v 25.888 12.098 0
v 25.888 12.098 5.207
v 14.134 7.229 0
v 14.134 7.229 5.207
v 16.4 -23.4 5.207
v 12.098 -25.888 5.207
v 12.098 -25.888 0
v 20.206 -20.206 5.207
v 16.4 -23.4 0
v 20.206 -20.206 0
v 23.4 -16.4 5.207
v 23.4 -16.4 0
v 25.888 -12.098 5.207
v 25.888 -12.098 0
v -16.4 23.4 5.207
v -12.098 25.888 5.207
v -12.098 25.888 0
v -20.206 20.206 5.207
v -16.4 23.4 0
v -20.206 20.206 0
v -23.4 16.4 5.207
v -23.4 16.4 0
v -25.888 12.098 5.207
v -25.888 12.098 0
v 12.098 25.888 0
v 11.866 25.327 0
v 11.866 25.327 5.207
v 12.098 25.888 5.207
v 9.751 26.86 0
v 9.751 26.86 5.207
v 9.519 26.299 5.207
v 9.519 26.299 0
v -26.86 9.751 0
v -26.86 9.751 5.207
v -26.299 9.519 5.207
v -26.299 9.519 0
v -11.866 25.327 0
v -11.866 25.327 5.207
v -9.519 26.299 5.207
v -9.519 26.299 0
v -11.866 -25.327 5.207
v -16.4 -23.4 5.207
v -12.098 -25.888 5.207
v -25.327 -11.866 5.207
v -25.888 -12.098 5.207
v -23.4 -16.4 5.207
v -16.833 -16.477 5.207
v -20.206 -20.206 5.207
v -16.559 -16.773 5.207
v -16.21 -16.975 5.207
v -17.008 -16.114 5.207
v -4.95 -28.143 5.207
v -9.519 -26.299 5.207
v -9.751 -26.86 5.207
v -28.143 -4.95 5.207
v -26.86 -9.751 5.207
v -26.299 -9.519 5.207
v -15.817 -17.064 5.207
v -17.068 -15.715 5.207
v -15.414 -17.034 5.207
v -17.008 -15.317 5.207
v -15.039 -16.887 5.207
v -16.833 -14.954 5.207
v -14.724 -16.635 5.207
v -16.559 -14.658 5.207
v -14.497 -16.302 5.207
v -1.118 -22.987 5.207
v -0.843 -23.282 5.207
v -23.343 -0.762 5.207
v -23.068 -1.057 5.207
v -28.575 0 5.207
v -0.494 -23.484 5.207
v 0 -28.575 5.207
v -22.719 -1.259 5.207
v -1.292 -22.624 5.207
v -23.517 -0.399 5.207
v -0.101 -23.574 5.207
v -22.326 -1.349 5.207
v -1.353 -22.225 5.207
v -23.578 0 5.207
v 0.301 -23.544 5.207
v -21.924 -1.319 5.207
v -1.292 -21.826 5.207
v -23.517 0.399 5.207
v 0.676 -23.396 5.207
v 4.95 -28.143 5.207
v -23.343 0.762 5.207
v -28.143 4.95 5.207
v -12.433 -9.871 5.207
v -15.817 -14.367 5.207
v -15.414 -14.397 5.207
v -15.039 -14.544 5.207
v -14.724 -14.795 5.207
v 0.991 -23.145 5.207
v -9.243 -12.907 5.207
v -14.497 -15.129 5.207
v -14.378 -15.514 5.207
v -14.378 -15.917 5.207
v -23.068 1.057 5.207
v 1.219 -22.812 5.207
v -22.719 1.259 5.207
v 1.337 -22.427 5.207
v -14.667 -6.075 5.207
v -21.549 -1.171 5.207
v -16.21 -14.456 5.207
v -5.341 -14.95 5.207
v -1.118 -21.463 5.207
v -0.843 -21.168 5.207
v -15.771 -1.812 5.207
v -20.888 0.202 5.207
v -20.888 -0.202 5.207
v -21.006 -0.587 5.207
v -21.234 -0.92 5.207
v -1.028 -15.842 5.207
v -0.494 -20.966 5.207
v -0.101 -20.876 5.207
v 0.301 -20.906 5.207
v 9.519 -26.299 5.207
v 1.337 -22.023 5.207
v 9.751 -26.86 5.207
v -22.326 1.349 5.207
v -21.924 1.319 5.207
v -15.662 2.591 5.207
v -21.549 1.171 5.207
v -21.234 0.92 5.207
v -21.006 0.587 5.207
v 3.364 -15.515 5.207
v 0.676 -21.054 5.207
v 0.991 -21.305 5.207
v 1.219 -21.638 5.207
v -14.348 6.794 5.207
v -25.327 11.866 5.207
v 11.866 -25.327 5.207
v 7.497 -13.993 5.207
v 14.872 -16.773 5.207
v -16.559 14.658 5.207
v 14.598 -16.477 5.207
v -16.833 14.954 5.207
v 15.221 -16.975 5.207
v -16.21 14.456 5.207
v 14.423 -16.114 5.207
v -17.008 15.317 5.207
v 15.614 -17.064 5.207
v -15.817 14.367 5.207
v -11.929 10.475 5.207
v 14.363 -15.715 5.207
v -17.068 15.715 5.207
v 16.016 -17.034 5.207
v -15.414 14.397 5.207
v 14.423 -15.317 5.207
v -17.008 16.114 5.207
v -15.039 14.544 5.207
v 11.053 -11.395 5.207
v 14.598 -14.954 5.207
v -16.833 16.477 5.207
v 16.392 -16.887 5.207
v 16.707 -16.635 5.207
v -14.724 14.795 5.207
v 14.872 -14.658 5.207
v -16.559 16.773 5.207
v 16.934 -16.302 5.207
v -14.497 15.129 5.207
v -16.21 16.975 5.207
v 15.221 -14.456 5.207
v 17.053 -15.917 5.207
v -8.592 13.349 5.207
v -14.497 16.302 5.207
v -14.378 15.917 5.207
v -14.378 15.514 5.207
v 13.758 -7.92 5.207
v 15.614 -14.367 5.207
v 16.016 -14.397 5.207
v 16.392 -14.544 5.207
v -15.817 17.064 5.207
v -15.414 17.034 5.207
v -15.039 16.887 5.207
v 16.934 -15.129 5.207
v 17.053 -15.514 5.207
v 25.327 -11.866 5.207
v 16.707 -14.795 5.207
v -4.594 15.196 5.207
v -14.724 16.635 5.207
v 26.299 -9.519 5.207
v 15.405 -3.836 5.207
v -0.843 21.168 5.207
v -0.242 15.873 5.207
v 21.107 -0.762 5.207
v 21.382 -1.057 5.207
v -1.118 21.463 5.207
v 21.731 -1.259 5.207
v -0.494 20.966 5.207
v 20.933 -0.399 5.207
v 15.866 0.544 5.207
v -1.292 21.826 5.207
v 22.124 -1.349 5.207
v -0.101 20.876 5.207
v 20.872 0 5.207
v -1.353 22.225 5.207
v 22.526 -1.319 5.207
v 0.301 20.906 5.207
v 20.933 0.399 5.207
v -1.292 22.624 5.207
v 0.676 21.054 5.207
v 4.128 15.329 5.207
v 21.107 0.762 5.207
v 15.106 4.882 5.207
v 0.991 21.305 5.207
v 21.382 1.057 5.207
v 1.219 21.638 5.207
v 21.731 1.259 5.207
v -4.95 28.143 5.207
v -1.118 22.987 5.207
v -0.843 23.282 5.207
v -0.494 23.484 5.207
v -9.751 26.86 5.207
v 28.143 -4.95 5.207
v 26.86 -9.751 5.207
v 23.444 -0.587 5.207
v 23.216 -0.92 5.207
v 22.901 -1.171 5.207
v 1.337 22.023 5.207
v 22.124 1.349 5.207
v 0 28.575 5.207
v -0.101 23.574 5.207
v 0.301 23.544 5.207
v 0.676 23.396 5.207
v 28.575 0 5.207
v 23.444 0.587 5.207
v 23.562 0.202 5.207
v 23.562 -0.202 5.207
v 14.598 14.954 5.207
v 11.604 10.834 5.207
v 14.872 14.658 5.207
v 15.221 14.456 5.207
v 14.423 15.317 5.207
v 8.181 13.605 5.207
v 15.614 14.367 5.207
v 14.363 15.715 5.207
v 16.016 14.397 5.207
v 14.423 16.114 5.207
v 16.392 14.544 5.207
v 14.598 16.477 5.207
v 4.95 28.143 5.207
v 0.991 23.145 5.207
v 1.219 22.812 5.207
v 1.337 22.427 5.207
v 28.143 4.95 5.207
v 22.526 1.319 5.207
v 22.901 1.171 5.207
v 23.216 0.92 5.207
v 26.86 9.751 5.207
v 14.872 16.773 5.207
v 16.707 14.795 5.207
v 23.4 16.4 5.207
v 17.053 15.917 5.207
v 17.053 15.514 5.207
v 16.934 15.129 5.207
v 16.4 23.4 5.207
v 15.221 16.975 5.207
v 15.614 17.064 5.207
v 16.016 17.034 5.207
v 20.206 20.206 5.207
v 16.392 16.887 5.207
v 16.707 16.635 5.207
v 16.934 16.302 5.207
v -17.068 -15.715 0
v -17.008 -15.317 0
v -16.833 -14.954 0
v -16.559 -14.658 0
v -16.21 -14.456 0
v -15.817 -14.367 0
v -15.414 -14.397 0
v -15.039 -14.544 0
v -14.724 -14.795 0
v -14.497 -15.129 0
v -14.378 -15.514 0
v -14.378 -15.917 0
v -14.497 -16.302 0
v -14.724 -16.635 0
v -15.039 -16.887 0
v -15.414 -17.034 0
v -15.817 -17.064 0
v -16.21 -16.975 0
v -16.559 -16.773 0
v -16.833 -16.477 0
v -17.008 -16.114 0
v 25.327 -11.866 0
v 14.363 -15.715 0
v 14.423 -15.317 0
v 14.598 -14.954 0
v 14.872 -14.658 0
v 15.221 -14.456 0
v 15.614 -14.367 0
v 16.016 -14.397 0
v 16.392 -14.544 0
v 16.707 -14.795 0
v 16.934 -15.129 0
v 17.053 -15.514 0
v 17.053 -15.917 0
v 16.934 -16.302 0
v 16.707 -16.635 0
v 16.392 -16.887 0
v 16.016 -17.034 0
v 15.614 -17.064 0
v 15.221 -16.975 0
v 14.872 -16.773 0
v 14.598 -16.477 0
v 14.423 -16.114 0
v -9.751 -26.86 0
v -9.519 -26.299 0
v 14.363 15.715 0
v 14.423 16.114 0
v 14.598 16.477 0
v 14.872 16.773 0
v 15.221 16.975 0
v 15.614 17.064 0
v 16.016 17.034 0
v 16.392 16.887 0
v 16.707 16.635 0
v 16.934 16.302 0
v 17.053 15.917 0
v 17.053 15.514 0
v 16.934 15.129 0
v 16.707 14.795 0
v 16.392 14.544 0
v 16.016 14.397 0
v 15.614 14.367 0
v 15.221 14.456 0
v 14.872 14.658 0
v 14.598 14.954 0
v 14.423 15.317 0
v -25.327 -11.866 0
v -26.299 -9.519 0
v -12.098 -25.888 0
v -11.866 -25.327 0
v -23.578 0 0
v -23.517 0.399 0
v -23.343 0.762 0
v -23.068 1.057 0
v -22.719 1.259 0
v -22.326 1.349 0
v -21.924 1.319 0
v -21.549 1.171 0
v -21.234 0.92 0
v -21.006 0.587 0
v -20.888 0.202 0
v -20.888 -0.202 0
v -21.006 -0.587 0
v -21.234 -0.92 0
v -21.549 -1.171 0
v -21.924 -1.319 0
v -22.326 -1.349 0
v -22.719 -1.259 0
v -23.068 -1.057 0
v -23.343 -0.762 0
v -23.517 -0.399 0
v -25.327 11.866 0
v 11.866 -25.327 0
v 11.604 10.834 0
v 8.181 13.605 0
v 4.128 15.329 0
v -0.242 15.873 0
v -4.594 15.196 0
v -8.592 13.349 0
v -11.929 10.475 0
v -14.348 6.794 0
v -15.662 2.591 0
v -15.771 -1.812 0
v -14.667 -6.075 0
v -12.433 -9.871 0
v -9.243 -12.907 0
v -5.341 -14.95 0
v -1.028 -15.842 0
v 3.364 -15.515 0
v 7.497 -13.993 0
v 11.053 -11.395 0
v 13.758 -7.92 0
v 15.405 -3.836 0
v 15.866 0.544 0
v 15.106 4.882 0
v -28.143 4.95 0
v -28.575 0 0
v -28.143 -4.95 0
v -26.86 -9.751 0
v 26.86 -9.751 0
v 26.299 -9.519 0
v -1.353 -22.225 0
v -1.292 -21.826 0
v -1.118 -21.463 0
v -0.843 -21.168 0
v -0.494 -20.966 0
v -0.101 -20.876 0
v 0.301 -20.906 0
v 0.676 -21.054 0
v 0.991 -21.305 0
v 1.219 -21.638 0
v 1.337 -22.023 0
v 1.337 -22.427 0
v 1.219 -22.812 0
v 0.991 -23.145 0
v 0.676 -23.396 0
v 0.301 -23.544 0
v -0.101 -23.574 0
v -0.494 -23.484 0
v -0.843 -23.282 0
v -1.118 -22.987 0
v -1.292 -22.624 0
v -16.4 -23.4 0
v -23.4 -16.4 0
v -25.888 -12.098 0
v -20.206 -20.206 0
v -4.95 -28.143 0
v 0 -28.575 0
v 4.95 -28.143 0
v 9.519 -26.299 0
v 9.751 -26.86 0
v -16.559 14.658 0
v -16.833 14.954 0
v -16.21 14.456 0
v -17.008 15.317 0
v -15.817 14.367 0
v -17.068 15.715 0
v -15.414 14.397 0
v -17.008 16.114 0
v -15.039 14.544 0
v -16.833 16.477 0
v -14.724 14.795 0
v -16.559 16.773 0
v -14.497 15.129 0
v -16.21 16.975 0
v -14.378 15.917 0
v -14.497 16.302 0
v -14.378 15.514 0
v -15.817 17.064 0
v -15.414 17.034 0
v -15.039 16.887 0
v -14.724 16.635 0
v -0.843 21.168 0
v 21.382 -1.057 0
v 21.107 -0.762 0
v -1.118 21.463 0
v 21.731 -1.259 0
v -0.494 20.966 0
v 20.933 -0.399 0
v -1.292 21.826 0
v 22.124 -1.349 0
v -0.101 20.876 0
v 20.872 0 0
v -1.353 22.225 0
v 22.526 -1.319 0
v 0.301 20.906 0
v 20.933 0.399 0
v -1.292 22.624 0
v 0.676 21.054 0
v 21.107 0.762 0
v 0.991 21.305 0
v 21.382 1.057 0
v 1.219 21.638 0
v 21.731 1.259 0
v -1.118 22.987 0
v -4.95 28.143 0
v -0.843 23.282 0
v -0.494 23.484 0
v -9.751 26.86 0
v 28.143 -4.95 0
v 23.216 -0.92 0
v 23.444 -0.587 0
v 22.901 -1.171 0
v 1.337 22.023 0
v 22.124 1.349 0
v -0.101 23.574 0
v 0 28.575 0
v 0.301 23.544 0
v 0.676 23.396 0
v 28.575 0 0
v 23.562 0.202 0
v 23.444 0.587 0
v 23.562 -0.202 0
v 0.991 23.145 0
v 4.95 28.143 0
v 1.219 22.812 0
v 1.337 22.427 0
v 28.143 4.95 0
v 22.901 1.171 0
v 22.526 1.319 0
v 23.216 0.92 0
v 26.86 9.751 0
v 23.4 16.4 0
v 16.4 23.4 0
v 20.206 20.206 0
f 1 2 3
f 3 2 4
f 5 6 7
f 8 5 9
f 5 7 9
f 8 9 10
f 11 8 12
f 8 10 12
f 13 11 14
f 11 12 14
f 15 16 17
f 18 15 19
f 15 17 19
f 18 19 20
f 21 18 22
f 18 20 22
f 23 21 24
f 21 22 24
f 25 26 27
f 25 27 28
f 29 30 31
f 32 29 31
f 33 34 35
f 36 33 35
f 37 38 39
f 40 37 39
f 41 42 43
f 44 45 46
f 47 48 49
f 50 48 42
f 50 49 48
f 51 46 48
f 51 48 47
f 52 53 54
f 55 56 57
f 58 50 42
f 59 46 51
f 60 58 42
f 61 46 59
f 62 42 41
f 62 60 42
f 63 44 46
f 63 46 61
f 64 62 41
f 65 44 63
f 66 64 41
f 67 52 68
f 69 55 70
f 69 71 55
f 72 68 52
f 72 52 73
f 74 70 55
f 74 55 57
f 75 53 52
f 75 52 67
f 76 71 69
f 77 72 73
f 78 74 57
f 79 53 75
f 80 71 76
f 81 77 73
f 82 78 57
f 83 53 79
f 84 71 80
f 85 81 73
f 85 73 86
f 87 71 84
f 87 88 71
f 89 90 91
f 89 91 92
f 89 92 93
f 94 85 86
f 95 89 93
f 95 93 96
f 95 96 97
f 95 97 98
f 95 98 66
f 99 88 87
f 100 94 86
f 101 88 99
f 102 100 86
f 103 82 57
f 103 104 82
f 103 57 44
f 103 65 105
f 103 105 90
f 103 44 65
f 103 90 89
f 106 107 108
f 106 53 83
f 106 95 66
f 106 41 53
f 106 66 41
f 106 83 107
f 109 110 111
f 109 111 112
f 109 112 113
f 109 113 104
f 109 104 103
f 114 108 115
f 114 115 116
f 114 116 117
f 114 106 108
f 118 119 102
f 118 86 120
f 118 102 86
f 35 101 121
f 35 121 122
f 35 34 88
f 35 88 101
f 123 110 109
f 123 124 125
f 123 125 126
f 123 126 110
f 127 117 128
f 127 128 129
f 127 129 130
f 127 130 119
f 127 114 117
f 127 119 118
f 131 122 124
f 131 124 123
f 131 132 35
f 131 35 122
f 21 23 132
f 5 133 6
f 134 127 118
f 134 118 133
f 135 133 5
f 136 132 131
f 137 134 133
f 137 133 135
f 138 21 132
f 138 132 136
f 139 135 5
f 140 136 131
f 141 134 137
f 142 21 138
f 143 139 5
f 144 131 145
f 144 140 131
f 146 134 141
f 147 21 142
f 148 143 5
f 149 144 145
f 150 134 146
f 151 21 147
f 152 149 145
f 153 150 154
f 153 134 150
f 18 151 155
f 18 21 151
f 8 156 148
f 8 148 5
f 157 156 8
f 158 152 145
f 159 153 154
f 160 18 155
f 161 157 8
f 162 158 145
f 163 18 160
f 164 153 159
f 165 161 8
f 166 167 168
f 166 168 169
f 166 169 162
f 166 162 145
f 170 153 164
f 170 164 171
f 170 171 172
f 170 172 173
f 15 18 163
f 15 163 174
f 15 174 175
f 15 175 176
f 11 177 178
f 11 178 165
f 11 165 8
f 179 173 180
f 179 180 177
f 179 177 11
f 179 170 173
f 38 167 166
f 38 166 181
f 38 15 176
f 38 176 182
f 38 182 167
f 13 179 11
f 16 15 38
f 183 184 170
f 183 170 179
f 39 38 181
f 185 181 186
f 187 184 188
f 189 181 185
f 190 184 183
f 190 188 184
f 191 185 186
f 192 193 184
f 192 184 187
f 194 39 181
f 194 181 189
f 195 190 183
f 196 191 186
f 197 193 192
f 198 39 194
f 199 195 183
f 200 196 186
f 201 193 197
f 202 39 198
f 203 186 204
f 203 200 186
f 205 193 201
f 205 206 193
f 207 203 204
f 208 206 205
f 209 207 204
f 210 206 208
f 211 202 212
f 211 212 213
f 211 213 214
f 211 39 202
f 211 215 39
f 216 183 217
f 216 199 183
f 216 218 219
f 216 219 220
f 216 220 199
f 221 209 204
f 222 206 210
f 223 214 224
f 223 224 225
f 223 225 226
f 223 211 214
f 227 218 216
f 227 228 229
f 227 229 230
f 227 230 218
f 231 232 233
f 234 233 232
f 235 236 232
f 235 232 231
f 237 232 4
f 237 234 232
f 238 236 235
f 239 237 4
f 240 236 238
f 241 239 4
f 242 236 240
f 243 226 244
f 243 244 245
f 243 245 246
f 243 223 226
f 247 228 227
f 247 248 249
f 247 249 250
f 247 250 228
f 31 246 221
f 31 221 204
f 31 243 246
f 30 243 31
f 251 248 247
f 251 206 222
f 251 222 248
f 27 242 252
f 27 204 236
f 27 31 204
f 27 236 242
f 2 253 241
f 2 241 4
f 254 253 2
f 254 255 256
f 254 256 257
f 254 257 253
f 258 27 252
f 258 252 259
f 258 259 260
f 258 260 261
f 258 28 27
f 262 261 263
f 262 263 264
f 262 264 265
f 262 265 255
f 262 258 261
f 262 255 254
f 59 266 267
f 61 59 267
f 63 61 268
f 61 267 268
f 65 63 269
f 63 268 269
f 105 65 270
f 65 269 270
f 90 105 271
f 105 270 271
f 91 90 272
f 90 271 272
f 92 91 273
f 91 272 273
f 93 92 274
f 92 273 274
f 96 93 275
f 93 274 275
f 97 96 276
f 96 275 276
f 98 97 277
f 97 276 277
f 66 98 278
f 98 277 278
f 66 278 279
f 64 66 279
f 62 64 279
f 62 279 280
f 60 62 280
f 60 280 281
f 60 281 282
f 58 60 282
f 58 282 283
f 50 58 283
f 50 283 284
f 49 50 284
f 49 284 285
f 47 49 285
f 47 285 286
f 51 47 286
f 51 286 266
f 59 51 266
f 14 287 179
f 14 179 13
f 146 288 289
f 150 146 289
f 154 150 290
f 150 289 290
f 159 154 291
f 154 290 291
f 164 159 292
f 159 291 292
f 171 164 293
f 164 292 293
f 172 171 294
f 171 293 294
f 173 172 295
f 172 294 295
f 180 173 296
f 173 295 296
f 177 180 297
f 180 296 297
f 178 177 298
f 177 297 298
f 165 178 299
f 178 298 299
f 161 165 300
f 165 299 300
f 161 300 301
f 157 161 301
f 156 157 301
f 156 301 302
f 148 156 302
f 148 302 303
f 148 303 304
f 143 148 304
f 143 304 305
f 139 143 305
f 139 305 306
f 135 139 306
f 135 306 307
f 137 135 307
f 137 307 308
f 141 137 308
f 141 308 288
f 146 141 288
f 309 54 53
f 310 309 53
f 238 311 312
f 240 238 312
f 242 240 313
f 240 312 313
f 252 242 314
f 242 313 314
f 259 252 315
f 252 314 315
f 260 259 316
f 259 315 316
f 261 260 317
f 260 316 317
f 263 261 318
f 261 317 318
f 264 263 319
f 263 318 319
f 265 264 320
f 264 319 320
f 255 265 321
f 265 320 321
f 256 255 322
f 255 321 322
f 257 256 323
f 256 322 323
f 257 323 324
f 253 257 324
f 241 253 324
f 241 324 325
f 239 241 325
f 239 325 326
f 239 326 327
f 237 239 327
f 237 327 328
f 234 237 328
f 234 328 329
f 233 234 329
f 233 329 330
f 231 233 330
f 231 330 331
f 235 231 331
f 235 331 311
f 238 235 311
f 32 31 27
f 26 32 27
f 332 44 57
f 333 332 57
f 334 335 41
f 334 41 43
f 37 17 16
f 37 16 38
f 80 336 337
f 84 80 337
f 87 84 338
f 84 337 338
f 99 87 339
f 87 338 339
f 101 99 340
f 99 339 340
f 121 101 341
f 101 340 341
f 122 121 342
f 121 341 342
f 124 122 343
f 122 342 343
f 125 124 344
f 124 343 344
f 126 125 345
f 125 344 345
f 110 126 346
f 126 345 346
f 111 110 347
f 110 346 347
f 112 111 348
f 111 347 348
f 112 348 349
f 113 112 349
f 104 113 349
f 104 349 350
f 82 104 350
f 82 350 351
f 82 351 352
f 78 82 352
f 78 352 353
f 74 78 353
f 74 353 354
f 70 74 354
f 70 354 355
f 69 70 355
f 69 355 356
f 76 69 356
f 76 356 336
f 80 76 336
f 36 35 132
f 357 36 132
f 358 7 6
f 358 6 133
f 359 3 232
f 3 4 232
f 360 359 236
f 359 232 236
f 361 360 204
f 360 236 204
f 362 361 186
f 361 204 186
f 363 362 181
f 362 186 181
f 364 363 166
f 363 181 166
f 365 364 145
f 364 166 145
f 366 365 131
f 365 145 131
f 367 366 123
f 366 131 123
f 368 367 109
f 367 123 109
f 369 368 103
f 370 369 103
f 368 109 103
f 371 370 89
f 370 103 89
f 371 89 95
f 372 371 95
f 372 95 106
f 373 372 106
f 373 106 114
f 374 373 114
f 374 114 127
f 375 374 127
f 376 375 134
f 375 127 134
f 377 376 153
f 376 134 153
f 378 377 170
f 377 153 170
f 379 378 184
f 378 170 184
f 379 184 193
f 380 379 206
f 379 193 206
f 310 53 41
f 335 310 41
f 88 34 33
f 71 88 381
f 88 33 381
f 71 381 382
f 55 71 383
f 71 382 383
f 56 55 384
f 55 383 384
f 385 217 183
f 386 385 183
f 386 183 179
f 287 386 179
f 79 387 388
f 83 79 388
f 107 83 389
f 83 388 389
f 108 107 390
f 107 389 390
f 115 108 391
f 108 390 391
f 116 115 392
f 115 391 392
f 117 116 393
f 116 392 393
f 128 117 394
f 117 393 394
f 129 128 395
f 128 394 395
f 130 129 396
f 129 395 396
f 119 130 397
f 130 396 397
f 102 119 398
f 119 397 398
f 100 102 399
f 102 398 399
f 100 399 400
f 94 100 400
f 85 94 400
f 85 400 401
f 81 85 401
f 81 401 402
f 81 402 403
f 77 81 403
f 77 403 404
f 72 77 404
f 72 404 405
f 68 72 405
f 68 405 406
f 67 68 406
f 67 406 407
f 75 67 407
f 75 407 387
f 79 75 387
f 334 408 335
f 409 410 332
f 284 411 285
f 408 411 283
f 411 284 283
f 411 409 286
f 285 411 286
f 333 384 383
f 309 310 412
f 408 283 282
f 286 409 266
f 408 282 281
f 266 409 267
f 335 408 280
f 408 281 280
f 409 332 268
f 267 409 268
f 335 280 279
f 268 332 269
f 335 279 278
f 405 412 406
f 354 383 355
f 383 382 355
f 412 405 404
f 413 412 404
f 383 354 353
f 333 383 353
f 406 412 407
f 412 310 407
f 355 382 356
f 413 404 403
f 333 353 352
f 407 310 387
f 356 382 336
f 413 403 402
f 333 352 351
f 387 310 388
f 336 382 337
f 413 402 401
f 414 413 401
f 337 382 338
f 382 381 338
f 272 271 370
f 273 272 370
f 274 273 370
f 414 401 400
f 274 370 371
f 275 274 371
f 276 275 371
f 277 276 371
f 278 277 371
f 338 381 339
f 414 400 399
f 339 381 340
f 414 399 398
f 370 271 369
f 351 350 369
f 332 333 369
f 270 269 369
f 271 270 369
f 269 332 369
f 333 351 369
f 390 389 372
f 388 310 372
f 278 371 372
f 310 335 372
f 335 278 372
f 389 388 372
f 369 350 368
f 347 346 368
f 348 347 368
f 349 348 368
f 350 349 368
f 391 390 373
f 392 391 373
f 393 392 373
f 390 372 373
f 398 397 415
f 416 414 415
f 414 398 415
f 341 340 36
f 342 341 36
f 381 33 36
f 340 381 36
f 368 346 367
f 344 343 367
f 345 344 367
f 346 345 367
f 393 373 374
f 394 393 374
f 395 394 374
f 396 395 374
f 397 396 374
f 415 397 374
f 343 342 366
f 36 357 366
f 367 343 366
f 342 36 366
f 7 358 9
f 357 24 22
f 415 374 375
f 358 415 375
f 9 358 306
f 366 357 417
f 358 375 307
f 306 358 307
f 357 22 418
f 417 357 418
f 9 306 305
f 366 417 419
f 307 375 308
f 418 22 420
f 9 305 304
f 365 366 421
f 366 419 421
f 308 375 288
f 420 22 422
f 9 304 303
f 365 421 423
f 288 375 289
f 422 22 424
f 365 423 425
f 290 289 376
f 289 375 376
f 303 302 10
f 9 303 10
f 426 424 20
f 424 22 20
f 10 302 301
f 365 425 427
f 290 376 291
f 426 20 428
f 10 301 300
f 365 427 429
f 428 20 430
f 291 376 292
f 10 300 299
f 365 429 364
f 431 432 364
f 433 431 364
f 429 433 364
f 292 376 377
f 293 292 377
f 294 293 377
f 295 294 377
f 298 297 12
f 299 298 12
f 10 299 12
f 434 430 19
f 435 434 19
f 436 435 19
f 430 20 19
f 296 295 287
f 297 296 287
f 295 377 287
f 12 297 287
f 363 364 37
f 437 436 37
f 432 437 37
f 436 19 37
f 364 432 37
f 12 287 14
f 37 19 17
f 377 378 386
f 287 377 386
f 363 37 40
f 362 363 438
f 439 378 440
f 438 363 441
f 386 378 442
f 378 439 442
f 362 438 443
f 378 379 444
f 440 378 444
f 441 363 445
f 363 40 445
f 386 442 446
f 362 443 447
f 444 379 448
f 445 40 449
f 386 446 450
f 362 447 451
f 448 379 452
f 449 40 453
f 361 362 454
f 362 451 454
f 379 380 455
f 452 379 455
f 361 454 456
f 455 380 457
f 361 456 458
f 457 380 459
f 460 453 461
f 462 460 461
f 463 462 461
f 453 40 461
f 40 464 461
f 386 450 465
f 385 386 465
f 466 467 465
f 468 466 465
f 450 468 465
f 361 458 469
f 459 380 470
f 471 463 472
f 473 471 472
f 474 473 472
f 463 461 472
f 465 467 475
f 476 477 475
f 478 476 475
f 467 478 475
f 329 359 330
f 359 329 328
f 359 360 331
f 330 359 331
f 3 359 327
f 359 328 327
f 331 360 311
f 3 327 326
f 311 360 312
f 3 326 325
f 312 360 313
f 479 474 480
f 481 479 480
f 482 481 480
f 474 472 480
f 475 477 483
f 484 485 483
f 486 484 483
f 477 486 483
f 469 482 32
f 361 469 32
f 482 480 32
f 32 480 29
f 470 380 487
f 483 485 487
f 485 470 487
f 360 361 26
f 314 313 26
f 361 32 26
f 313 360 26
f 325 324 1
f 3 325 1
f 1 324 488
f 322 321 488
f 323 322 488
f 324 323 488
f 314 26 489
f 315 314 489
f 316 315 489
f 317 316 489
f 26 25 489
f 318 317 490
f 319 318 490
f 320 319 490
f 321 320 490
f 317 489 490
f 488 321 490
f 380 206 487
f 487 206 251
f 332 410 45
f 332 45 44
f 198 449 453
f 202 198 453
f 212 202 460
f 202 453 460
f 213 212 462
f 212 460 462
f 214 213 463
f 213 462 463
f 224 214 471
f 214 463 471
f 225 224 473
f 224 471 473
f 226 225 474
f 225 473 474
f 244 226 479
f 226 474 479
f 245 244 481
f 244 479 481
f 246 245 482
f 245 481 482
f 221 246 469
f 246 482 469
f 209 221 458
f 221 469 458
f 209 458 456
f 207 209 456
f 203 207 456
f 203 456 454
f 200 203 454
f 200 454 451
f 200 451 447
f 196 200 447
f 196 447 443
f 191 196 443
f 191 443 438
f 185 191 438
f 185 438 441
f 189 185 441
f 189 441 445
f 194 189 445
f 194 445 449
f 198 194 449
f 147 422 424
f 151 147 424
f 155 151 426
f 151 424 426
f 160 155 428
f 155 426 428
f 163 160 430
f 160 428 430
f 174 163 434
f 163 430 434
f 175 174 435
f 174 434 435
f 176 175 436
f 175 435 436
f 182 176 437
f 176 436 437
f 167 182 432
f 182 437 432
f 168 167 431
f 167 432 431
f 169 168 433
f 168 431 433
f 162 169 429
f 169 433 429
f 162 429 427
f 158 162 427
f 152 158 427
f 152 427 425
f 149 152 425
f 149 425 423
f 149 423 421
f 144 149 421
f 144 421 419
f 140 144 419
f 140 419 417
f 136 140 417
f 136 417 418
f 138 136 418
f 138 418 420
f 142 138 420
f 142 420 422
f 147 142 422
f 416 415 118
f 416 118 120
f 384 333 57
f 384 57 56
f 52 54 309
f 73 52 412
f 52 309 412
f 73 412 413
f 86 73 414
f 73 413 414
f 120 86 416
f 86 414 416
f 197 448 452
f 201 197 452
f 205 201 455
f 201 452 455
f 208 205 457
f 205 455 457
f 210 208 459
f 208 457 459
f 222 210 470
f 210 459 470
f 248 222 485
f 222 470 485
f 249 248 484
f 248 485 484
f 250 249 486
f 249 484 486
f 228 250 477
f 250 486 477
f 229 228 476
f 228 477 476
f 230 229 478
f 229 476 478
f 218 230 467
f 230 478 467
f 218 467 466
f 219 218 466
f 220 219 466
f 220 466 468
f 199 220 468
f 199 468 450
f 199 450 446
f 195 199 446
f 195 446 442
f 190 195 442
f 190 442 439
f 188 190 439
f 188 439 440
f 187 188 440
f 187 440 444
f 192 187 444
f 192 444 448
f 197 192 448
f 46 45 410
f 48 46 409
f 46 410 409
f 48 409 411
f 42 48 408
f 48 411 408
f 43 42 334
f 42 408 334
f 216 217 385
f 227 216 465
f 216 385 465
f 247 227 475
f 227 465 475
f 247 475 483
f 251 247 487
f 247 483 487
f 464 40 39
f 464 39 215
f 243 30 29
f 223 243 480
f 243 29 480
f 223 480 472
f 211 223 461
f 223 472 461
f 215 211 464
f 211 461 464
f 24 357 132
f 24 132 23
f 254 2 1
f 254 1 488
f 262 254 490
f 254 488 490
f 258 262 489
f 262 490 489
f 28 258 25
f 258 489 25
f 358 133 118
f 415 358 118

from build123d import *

# Parameters (mm, degrees)
SKETCH4_R             = 28.575
BOSS_EXTRUDE2_DEPTH   = 5.207
SKETCH5_R             = 15.875
CUT_EXTRUDE5_DEPTH    = 6.207
CUT_EXTRUDE11_DEPTH   = 6.207
F_6_32_TAPPED_HOLE1_D = 2.7051


with BuildPart() as part:
    # Sketch4 → Boss-Extrude2 (new body)
    with BuildSketch(Plane.XY):
        Circle(SKETCH4_R)
    extrude(amount=BOSS_EXTRUDE2_DEPTH)

    # Sketch5 → Cut-Extrude5 (cut, through all)
    with BuildSketch(Plane.XY.offset(5.207)):
        Circle(SKETCH5_R)
    extrude(amount=-CUT_EXTRUDE5_DEPTH, mode=Mode.SUBTRACT)

    # Sketch8 → Cut-Extrude11 (cut, through all)
    with BuildSketch(Plane.XY.offset(5.207)):
        Polygon((32.367148217, 14.781549861), (13.593916116, 7.005422516), (14.565932035, 4.658768503), (33.339164135, 12.434895849), align=None)
        Polygon((12.351510066, 26.500513186), (10.004856053, 27.472529104), (9.518848094, 26.299202097), (11.865502107, 25.327186179), align=None)
        Polygon((-10.004856053, 27.472529104), (-12.351510066, 26.500513186), (-11.865502107, 25.327186179), (-9.518848094, 26.299202097), align=None)
        Polygon((-26.500513186, 12.351510066), (-27.472529104, 10.004856053), (-26.299202097, 9.518848094), (-25.327186179, 11.865502107), align=None)
        Polygon((-27.472529104, -10.004856053), (-26.500513186, -12.351510066), (-25.327186179, -11.865502107), (-26.299202097, -9.518848094), align=None)
        Polygon((-12.351510066, -26.500513186), (-10.004856053, -27.472529104), (-9.518848094, -26.299202097), (-11.865502107, -25.327186179), align=None)
        Polygon((10.004856053, -27.472529104), (12.351510066, -26.500513186), (11.865502107, -25.327186179), (9.518848094, -26.299202097), align=None)
        Polygon((26.500513186, -12.351510066), (27.472529104, -10.004856053), (26.299202097, -9.518848094), (25.327186179, -11.865502107), align=None)
    extrude(amount=-CUT_EXTRUDE11_DEPTH, mode=Mode.SUBTRACT)

    # #6-32 Tapped Hole1 (through all)
    with Locations(Plane.XY.offset(5.207)):
        with Locations((22.225, 0), (15.715448212, -15.715448212), (0, -22.225), (-15.715448212, -15.715448212), (-22.225, 0), (-15.715448212, 15.715448212), (0, 22.225), (15.715448212, 15.715448212)):
            Hole(F_6_32_TAPPED_HOLE1_D / 2)


solid = part.part
